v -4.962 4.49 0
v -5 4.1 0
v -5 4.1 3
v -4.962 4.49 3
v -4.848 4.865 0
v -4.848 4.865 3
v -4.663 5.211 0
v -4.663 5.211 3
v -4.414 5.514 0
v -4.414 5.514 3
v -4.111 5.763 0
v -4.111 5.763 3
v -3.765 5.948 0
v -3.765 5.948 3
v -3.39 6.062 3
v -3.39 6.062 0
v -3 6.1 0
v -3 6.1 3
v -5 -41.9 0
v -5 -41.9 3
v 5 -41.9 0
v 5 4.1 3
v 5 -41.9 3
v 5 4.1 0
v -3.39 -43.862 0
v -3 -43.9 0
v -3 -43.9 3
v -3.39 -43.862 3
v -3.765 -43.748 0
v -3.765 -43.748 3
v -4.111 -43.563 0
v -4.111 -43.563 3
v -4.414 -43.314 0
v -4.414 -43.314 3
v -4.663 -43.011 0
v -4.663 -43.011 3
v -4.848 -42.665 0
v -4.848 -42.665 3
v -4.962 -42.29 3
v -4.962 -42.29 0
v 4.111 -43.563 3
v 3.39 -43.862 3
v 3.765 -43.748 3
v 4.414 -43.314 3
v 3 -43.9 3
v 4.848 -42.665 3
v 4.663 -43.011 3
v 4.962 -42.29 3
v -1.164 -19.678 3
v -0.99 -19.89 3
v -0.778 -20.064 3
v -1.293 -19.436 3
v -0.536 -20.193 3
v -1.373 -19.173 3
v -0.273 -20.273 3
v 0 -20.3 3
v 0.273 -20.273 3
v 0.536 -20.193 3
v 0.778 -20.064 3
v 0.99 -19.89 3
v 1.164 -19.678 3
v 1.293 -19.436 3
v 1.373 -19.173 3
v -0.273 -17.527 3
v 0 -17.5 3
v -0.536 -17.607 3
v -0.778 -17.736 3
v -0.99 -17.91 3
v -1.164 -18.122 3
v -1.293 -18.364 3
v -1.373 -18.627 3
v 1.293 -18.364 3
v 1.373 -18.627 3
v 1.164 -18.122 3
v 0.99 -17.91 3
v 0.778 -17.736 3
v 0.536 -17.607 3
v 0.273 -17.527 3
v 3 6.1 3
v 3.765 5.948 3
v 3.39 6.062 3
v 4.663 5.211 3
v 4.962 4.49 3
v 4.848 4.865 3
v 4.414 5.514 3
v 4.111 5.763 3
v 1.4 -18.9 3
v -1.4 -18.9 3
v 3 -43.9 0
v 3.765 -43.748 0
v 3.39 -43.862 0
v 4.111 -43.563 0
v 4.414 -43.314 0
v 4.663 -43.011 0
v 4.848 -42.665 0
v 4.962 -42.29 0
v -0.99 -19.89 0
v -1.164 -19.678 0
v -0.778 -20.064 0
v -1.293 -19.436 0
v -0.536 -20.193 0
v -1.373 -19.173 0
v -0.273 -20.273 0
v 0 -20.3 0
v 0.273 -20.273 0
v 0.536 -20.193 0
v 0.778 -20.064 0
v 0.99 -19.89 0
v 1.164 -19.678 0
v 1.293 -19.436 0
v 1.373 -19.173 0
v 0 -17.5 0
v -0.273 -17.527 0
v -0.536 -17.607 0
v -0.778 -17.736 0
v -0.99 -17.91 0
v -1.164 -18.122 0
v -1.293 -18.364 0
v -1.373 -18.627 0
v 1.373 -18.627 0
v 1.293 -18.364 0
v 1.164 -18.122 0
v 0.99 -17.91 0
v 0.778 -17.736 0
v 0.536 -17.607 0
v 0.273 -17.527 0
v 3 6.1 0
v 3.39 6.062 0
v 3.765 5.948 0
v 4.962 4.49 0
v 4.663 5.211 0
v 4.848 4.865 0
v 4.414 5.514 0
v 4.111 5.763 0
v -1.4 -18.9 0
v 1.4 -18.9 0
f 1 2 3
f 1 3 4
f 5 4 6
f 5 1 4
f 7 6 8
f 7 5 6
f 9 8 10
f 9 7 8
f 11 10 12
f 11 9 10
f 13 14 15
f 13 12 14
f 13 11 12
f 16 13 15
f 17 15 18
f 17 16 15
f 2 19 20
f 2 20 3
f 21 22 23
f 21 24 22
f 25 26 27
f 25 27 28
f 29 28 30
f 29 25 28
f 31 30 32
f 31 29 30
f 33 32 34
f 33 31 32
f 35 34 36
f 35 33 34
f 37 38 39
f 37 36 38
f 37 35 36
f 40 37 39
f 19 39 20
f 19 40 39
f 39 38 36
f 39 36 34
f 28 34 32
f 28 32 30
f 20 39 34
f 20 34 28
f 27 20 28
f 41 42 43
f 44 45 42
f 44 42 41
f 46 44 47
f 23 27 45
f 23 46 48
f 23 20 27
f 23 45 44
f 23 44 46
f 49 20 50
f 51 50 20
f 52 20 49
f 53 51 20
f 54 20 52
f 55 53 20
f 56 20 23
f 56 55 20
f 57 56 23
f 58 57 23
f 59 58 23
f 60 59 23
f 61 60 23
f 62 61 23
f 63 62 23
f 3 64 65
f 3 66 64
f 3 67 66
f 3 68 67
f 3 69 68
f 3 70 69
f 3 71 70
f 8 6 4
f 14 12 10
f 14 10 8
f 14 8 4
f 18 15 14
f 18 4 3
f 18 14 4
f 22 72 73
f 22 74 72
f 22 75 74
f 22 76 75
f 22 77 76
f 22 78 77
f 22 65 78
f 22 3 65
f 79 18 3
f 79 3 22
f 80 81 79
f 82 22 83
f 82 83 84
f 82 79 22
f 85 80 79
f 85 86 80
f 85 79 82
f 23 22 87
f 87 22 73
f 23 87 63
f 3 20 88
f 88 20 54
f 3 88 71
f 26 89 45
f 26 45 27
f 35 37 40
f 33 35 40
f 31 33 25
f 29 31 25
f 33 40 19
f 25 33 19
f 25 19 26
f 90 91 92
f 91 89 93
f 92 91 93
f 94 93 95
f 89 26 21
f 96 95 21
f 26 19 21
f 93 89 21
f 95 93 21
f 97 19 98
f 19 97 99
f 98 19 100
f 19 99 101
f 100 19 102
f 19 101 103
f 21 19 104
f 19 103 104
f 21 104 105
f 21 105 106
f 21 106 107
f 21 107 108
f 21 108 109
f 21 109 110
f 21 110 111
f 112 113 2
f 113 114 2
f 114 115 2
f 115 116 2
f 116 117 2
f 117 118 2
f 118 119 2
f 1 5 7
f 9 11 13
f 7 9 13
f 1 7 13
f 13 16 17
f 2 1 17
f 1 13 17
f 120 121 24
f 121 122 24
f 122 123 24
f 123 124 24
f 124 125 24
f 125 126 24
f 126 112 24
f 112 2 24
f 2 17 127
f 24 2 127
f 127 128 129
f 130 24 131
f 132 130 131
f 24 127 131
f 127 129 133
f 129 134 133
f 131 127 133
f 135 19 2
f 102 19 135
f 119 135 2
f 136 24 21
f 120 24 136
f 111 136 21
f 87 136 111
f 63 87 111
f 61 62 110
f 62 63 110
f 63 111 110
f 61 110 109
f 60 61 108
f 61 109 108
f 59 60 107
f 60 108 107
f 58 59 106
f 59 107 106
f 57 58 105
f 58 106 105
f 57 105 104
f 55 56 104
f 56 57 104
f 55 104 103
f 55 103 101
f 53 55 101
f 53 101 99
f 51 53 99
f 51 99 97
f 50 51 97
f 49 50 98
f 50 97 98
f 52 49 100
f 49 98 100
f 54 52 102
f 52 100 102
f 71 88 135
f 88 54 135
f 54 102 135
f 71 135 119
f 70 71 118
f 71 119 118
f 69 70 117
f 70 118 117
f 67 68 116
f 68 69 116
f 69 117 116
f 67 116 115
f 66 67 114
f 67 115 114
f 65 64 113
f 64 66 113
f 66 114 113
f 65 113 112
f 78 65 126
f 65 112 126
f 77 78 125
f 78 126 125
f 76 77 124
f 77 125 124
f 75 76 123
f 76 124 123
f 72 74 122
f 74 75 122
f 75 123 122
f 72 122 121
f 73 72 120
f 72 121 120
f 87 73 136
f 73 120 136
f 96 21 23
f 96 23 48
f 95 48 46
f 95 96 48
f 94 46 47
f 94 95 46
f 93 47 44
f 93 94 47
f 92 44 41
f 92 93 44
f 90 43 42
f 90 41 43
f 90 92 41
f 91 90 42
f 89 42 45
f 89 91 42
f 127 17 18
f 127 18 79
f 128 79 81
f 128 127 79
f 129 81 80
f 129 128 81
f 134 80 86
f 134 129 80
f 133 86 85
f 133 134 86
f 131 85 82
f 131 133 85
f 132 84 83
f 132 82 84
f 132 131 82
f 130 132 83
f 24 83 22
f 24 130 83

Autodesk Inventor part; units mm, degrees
ref_plane "YZ Plane" through (0, 0, 0) normal (1, 0, 0) x (0, 1, 0)
ref_plane "XZ Plane" through (0, 0, 0) normal (0, 1, 0) x (-1, 0, 0)
ref_plane "XY Plane" through (0, 0, 0) normal (0, 0, 1) x (1, 0, 0)
ref_plane "Work Plane1" through (0, 0, 0) normal (0, 0, 1) x (1, 0, 0)
sketch "Sketch1" plane through (0, 0, 0) normal (0, 0, 1) x (1, 0, 0)
  circle A0 centre (0, -18.9) radius 1.4 projected
  line L0 (3, -43.9) -> (-3, -43.9)
  line L1 (-5, -41.9) -> (-5, 4.1)
  line L2 (-3, 6.1) -> (3, 6.1)
  line L3 (5, 4.1) -> (5, -41.9)
  line L4 (5, -43.9) -> (-5, 6.1) construction
  line L5 (-5, -43.9) -> (5, 6.1) construction
  arc A1 (-5, -41.9) -> (-3, -43.9) centre (-3, -41.9) ccw
  arc A2 (3, -43.9) -> (5, -41.9) centre (3, -41.9) ccw
  arc A3 (5, 4.1) -> (3, 6.1) centre (3, 4.1) ccw
  arc A4 (-3, 6.1) -> (-5, 4.1) centre (-3, 4.1) ccw
  point P0 (0, 0)
  dimension "d0" = 10
  dimension "d1" = 50
  dimension "d2" = 2
extrude "Extrusion1" add sketch "Sketch1" along normal blind 3
properties part number "20_Cube_4_insert_xy_levelarm_2"
